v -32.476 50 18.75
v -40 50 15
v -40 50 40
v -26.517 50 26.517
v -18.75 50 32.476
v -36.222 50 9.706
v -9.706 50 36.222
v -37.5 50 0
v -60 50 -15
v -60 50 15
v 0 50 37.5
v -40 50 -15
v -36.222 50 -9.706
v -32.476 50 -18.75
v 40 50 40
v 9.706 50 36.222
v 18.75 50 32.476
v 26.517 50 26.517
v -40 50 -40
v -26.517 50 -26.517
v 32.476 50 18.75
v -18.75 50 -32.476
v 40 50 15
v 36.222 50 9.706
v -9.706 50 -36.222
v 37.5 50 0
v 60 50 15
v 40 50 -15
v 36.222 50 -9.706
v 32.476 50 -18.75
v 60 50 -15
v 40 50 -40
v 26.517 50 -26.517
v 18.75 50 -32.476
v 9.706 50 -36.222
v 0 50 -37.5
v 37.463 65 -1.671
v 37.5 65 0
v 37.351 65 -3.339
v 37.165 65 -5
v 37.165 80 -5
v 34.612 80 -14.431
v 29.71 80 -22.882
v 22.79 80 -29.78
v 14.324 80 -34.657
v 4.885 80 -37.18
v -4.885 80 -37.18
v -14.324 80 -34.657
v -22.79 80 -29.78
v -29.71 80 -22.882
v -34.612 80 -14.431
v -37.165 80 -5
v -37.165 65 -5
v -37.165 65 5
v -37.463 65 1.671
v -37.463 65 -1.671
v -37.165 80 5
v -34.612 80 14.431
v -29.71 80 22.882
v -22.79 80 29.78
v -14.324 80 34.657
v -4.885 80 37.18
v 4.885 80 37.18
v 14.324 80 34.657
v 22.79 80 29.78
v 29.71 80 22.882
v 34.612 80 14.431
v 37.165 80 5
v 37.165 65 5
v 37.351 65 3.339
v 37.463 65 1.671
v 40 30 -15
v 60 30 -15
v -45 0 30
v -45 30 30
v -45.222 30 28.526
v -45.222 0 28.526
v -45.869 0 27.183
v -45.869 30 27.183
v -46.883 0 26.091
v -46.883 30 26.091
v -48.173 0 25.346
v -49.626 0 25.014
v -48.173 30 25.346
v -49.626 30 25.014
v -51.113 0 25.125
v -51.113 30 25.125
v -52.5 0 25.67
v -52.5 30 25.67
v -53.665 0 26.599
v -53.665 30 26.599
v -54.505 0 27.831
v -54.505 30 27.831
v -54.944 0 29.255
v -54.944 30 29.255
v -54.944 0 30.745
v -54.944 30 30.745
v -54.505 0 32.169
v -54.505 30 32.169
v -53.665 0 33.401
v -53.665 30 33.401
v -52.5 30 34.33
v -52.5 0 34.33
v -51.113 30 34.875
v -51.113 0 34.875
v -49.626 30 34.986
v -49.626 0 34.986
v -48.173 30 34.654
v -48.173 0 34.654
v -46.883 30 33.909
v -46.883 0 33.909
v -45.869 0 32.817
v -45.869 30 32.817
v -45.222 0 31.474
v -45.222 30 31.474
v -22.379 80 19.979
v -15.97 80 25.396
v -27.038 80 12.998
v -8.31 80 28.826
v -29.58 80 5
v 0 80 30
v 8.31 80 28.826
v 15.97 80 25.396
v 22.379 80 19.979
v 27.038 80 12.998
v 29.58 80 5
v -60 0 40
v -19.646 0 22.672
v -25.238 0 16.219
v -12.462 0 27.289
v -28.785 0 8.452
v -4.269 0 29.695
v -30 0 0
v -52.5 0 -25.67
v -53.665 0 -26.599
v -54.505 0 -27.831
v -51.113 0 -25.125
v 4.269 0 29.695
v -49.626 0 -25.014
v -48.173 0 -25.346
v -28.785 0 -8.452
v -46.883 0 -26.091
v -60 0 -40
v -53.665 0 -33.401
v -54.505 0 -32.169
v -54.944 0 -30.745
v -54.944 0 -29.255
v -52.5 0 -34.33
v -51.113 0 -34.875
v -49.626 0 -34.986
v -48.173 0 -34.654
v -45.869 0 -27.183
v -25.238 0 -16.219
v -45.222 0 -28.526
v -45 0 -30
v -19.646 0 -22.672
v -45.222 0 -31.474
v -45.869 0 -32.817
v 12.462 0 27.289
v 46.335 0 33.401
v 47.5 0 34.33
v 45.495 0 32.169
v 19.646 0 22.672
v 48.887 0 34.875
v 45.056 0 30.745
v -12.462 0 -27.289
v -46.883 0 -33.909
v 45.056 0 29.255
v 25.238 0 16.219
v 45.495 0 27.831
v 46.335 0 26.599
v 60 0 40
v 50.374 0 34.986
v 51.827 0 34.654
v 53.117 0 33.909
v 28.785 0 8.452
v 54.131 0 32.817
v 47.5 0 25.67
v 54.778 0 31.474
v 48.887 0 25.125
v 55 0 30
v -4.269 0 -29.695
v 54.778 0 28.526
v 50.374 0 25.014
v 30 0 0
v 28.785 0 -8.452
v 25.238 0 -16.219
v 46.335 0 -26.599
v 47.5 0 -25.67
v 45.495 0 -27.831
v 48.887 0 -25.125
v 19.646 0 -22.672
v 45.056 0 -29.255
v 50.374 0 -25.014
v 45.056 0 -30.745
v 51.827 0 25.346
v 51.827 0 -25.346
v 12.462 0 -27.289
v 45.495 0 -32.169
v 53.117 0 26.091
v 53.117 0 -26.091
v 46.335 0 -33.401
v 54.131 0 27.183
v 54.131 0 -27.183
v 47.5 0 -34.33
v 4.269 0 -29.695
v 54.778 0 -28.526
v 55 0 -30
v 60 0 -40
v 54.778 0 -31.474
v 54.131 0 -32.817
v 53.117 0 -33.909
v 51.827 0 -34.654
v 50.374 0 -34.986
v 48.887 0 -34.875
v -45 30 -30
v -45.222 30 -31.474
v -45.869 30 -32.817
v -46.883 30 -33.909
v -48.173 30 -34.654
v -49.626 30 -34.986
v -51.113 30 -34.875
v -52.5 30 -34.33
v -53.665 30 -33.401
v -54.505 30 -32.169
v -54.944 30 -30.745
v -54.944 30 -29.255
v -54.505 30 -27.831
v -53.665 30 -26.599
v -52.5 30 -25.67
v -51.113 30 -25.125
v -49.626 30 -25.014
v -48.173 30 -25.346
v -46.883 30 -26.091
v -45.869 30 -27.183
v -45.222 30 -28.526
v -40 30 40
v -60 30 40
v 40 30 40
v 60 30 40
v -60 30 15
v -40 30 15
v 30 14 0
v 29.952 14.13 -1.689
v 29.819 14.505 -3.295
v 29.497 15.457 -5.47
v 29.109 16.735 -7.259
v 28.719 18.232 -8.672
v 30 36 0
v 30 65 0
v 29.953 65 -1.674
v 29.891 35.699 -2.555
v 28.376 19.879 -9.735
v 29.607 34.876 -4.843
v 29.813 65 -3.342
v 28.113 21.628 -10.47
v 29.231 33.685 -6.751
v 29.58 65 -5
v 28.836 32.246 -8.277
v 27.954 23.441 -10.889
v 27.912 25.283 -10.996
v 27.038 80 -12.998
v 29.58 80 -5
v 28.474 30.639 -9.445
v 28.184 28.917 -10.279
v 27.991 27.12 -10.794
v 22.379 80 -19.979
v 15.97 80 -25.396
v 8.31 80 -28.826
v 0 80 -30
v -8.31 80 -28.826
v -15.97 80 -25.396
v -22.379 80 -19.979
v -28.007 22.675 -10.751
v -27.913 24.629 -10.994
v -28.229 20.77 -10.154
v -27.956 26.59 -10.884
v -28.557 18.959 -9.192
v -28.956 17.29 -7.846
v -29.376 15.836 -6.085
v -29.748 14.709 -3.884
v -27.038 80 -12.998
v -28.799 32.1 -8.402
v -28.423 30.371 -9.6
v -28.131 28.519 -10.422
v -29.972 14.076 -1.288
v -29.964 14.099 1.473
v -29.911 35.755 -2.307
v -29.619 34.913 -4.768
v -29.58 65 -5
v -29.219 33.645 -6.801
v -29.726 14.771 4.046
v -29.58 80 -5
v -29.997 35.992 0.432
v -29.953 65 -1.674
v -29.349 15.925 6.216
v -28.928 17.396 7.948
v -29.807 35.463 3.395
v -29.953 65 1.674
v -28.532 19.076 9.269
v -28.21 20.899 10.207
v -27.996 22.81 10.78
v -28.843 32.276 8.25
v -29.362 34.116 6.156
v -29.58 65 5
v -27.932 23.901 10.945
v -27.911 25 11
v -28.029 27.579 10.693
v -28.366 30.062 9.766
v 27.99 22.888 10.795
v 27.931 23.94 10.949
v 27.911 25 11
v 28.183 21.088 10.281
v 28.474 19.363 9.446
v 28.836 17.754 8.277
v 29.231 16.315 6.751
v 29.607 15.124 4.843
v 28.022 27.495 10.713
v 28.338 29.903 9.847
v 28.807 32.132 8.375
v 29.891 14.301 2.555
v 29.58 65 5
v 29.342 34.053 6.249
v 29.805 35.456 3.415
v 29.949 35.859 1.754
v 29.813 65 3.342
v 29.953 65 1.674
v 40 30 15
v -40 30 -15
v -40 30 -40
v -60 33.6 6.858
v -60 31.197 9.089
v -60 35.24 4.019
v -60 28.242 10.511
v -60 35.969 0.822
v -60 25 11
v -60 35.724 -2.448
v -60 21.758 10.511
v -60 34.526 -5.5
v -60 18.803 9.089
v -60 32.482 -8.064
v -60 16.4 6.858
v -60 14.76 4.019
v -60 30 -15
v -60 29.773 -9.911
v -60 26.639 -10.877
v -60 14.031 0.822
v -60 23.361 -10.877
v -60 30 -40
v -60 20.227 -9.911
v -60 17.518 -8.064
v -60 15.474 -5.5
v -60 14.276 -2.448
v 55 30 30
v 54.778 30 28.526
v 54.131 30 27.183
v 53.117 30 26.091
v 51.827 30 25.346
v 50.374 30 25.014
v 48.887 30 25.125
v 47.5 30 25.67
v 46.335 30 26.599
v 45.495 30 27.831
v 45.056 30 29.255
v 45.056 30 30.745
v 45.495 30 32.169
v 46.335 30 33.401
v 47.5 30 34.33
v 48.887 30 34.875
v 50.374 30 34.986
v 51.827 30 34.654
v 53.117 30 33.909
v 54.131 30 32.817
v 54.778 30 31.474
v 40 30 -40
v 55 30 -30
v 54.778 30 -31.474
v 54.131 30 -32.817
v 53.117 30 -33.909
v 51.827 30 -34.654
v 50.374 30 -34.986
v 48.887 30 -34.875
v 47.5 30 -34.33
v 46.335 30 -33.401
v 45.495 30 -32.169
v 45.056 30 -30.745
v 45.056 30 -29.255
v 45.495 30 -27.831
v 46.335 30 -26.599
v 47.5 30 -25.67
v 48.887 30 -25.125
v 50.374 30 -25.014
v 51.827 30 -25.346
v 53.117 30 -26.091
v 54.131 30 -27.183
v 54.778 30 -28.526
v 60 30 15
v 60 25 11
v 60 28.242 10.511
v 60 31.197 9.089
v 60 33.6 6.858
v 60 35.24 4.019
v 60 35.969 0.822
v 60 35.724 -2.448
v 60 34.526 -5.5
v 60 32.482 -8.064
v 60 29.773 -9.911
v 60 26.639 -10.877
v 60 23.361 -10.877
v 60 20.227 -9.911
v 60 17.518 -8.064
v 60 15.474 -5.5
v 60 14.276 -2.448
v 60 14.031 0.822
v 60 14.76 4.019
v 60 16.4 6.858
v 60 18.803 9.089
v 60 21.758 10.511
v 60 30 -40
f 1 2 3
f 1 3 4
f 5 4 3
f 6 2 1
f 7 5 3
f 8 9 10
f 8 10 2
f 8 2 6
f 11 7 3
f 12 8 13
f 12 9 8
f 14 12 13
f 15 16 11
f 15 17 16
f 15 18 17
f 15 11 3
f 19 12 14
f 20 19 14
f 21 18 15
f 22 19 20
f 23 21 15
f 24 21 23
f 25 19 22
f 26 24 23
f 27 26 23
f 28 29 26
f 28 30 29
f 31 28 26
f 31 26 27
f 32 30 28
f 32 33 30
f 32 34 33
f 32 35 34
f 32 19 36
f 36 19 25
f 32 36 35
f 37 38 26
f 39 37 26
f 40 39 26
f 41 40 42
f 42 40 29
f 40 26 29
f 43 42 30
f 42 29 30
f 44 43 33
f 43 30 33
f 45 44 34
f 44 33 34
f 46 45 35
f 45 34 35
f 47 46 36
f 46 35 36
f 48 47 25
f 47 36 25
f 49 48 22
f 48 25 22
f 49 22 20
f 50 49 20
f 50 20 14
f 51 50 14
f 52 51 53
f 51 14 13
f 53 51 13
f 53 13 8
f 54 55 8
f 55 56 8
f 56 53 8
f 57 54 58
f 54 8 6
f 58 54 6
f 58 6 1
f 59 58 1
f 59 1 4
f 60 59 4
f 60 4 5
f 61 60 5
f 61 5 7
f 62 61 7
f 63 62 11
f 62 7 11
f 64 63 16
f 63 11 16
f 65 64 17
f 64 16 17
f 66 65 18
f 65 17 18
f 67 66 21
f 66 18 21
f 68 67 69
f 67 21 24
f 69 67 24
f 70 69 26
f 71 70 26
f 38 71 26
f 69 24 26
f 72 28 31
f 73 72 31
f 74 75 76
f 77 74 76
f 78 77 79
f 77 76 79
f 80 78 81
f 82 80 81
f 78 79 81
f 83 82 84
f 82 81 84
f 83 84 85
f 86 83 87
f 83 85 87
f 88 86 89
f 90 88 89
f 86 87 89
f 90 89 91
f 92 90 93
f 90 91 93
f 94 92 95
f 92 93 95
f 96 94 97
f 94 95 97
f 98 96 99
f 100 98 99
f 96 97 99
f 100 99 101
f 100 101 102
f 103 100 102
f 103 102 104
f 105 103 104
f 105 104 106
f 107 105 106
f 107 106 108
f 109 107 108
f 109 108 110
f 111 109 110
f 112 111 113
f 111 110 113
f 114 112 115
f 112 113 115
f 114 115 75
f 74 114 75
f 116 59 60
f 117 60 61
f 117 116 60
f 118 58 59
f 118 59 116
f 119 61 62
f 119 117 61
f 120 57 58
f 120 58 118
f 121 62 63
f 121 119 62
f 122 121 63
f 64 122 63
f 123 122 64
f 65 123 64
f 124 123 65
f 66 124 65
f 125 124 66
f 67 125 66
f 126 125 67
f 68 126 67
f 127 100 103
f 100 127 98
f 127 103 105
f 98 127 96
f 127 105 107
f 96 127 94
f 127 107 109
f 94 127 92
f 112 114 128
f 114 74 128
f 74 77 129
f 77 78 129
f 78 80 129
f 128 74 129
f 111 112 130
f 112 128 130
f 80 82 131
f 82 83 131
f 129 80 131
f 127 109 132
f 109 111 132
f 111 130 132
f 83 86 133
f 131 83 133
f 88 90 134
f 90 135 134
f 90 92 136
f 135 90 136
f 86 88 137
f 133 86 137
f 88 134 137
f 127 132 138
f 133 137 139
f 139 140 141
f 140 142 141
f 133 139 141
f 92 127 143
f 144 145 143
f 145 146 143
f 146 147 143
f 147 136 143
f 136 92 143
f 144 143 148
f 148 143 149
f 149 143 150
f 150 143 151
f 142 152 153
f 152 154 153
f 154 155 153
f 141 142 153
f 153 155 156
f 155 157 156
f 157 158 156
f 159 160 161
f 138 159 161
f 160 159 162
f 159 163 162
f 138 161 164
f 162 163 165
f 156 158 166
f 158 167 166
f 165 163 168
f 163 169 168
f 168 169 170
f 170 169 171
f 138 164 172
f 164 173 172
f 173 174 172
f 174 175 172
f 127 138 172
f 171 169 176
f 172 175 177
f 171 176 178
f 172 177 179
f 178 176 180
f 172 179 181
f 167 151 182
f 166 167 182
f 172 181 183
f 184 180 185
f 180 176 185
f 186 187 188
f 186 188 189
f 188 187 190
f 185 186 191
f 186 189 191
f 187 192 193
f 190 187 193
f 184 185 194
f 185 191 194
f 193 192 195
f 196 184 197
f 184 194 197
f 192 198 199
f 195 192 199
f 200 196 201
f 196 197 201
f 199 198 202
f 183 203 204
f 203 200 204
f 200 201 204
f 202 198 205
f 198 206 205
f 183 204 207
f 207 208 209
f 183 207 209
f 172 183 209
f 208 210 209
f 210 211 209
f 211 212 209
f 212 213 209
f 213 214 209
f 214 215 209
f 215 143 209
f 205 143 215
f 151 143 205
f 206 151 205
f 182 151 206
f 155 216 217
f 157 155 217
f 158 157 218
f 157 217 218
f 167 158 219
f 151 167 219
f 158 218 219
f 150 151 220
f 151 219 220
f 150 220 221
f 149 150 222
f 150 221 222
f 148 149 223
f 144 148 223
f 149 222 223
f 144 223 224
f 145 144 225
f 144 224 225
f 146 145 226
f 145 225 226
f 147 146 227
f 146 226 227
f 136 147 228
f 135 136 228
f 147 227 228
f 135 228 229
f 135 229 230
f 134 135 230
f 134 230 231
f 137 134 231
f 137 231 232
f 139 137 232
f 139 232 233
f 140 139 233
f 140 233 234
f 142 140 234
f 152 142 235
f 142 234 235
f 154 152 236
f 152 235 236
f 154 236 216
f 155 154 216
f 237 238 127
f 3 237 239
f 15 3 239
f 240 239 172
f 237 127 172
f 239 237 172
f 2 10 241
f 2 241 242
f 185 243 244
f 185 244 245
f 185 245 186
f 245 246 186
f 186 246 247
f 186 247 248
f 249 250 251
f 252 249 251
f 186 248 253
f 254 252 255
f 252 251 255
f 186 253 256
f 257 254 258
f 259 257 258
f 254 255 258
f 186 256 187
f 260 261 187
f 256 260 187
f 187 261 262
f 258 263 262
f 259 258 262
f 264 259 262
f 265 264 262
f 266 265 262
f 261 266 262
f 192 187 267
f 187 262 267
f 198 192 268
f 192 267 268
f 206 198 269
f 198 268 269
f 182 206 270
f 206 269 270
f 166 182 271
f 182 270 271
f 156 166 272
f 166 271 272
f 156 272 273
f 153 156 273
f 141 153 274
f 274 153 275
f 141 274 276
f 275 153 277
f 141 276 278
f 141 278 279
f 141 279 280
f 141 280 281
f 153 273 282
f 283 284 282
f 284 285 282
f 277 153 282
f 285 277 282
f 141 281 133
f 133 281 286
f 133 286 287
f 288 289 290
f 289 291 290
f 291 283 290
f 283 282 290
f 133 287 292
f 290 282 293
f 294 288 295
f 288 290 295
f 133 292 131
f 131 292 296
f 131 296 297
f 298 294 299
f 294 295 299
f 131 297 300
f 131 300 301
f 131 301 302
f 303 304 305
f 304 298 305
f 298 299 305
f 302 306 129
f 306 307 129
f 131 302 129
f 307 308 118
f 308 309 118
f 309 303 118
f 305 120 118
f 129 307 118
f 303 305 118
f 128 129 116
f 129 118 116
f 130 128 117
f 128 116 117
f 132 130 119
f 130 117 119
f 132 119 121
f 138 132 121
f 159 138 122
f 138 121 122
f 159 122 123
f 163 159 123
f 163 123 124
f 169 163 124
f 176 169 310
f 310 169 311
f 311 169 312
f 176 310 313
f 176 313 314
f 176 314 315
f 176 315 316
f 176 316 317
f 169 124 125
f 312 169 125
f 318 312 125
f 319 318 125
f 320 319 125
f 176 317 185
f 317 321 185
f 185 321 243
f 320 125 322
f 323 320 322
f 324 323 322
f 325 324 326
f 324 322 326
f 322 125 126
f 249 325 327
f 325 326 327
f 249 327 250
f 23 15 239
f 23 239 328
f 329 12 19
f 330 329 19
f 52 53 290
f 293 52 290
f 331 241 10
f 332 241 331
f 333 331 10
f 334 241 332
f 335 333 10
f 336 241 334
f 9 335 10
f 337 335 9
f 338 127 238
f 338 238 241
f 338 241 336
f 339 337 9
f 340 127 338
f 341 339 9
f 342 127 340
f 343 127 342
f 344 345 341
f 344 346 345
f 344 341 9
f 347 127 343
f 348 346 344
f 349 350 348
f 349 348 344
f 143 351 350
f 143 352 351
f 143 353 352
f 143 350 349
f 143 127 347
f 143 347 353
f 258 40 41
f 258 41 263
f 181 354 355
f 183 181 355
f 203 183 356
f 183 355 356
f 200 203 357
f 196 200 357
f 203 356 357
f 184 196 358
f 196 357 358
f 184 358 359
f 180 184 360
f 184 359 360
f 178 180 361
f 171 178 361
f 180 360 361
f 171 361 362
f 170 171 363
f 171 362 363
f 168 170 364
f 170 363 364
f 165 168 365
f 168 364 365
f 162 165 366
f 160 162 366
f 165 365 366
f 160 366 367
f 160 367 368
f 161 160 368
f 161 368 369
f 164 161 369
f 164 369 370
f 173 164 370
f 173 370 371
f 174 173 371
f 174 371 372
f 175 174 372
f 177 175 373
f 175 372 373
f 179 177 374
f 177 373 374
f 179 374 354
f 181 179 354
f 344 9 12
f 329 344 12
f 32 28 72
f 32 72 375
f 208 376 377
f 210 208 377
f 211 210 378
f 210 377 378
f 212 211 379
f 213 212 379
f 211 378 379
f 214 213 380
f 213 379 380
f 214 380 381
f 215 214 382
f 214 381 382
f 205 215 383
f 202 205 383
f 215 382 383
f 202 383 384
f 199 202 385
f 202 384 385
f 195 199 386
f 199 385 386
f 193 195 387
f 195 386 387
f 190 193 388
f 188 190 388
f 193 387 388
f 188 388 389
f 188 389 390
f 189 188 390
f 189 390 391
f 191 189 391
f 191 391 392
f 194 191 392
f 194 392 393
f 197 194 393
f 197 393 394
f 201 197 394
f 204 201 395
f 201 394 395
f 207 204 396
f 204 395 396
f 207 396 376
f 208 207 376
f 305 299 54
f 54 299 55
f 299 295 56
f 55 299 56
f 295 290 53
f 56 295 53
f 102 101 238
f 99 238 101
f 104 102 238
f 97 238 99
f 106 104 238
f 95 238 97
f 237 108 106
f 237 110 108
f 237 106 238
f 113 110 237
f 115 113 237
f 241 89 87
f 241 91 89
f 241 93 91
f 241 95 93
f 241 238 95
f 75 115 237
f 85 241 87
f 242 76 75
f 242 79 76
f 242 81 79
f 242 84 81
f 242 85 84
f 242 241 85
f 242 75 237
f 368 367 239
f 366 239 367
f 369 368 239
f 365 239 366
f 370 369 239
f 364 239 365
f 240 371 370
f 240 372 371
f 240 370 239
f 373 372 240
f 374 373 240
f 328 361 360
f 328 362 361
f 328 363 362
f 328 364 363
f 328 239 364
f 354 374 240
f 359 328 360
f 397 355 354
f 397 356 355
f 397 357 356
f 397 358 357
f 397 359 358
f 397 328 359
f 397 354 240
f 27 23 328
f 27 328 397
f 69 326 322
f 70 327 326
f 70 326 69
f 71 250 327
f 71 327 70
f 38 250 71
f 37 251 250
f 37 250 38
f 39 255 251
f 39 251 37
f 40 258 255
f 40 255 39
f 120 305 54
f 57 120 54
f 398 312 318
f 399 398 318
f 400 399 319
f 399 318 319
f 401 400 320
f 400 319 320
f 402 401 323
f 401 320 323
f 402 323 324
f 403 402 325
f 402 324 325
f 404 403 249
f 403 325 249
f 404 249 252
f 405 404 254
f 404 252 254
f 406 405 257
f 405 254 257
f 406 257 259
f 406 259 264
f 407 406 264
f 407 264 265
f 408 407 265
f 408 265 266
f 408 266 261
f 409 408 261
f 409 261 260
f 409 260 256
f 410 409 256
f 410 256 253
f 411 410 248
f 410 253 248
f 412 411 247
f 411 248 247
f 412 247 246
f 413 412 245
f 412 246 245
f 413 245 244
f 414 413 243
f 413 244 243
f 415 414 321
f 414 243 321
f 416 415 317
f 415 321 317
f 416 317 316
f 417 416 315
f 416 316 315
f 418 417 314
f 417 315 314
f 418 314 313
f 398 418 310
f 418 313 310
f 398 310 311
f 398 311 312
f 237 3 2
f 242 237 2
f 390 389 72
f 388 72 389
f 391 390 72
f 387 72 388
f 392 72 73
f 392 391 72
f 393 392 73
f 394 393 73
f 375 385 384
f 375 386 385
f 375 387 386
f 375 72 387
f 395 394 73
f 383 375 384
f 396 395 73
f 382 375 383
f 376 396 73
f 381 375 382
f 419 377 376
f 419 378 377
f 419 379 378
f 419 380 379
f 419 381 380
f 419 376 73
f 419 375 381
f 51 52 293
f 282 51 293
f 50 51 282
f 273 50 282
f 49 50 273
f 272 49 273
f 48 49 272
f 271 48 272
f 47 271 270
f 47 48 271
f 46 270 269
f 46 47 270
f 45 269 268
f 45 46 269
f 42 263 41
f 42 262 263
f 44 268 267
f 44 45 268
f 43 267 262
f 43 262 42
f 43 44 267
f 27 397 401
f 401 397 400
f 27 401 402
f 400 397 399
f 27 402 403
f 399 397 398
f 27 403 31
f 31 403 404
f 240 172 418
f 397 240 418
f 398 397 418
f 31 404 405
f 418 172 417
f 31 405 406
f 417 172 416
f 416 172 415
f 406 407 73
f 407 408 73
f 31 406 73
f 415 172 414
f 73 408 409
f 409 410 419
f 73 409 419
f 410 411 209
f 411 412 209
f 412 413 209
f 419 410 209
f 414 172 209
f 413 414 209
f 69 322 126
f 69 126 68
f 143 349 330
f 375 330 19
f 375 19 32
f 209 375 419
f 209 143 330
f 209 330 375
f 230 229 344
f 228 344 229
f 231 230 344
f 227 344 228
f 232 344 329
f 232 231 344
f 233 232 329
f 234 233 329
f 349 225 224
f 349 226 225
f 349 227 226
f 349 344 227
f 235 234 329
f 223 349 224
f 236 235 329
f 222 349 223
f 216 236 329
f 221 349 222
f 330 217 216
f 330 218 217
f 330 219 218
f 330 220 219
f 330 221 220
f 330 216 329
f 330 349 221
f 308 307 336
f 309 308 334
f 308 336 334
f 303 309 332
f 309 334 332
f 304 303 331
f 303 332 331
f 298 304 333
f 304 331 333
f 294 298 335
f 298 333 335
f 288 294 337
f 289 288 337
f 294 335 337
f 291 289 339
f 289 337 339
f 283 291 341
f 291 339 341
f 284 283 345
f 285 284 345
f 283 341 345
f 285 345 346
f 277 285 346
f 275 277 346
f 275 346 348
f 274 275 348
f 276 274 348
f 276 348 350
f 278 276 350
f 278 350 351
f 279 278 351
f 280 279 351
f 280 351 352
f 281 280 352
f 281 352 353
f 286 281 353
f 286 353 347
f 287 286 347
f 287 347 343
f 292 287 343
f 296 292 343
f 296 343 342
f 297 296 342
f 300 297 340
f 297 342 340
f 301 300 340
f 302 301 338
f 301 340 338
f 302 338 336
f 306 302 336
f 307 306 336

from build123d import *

# Parameters (mm, degrees)
SKETCH_1_W          = 120
SKETCH_1_H          = 80
EXTRUDE_1_DEPTH     = 50
SKETCH_2_W          = 20
SKETCH_2_H          = 25
CUT_EXTRUDE_1_DEPTH = 20
SKETCH_3_R          = 5
CUT_EXTRUDE_2_DEPTH = 30
SKETCH_5_R          = 11
CUT_EXTRUDE_4_DEPTH = 120
SKETCH_6_R          = 37.5
EXTRUDE_2_DEPTH     = 30
SKETCH_7_R          = 30
CUT_EXTRUDE_5_DEPTH = 81
CUT_EXTRUDE_6_DEPTH = 15


with BuildPart() as part:
    # Эскиз1 → Бобышка-Вытянуть1 (new body)
    with BuildSketch(Plane(origin=(0, 0, 0), x_dir=(1, 0, 0), z_dir=(0, 1, 0))):
        Rectangle(SKETCH_1_W, SKETCH_1_H)
    extrude(amount=EXTRUDE_1_DEPTH)

    # Эскиз2 → Вырез-Вытянуть1 (cut)
    with BuildSketch(Plane(origin=(0, 50, 0), x_dir=(1, 0, 0), z_dir=(0, 1, 0))):
        with Locations((-50, 27.5)):
            Rectangle(SKETCH_2_W, SKETCH_2_H)
        with Locations((-50, -27.5)):
            Rectangle(SKETCH_2_W, SKETCH_2_H)
        with Locations((50, -27.5)):
            Rectangle(SKETCH_2_W, SKETCH_2_H)
        with Locations((50, 27.5)):
            Rectangle(SKETCH_2_W, SKETCH_2_H)
    extrude(amount=-CUT_EXTRUDE_1_DEPTH, mode=Mode.SUBTRACT)

    # Эскиз3 → Вырез-Вытянуть2 (cut)
    with BuildSketch(Plane(origin=(0, 30, 0), x_dir=(1, 0, 0), z_dir=(0, 1, 0))):
        with Locations((-50, -30)):
            Circle(SKETCH_3_R)
        with Locations((-50, 30)):
            Circle(SKETCH_3_R)
        with Locations((50, 30)):
            Circle(SKETCH_3_R)
        with Locations((50, -30)):
            Circle(SKETCH_3_R)
    extrude(amount=-CUT_EXTRUDE_2_DEPTH, mode=Mode.SUBTRACT)

    # Эскиз5 → Вырез-Вытянуть4 (cut)
    with BuildSketch(Plane.ZY.offset(60)):
        with Locations((0, 25)):
            Circle(SKETCH_5_R)
    extrude(amount=-CUT_EXTRUDE_4_DEPTH, mode=Mode.SUBTRACT)

    # Эскиз6 → Бобышка-Вытянуть2 (add)
    with BuildSketch(Plane(origin=(0, 50, 0), x_dir=(1, 0, 0), z_dir=(0, 1, 0))):
        Circle(SKETCH_6_R)
    extrude(amount=EXTRUDE_2_DEPTH)

    # Эскиз7 → Вырез-Вытянуть5 (cut, through all)
    with BuildSketch(Plane(origin=(0, 80, 0), x_dir=(1, 0, 0), z_dir=(0, 1, 0))):
        Circle(SKETCH_7_R)
    extrude(amount=-CUT_EXTRUDE_5_DEPTH, mode=Mode.SUBTRACT)

    # Эскиз8 → Вырез-Вытянуть6 (cut)
    with BuildSketch(Plane(origin=(0, 80, 0), x_dir=(1, 0, 0), z_dir=(0, 1, 0))):
        with BuildLine():
            Line((-29.580398915, -5), (-37.165171868, -5))
            ThreePointArc((-37.165171868, -5), (-37.5, 0), (-37.165171868, 5))
            Line((-37.165171868, 5), (-29.580398915, 5))
            ThreePointArc((-29.580398915, 5), (-30, 0), (-29.580398915, -5))
        make_face()
        with BuildLine():
            Line((37.165171868, 5), (29.580398915, 5))
            ThreePointArc((29.580398915, 5), (30, 0), (29.580398915, -5))
            Line((29.580398915, -5), (37.165171868, -5))
            ThreePointArc((37.165171868, -5), (37.5, 0), (37.165171868, 5))
        make_face()
    extrude(amount=-CUT_EXTRUDE_6_DEPTH, mode=Mode.SUBTRACT)


solid = part.part
